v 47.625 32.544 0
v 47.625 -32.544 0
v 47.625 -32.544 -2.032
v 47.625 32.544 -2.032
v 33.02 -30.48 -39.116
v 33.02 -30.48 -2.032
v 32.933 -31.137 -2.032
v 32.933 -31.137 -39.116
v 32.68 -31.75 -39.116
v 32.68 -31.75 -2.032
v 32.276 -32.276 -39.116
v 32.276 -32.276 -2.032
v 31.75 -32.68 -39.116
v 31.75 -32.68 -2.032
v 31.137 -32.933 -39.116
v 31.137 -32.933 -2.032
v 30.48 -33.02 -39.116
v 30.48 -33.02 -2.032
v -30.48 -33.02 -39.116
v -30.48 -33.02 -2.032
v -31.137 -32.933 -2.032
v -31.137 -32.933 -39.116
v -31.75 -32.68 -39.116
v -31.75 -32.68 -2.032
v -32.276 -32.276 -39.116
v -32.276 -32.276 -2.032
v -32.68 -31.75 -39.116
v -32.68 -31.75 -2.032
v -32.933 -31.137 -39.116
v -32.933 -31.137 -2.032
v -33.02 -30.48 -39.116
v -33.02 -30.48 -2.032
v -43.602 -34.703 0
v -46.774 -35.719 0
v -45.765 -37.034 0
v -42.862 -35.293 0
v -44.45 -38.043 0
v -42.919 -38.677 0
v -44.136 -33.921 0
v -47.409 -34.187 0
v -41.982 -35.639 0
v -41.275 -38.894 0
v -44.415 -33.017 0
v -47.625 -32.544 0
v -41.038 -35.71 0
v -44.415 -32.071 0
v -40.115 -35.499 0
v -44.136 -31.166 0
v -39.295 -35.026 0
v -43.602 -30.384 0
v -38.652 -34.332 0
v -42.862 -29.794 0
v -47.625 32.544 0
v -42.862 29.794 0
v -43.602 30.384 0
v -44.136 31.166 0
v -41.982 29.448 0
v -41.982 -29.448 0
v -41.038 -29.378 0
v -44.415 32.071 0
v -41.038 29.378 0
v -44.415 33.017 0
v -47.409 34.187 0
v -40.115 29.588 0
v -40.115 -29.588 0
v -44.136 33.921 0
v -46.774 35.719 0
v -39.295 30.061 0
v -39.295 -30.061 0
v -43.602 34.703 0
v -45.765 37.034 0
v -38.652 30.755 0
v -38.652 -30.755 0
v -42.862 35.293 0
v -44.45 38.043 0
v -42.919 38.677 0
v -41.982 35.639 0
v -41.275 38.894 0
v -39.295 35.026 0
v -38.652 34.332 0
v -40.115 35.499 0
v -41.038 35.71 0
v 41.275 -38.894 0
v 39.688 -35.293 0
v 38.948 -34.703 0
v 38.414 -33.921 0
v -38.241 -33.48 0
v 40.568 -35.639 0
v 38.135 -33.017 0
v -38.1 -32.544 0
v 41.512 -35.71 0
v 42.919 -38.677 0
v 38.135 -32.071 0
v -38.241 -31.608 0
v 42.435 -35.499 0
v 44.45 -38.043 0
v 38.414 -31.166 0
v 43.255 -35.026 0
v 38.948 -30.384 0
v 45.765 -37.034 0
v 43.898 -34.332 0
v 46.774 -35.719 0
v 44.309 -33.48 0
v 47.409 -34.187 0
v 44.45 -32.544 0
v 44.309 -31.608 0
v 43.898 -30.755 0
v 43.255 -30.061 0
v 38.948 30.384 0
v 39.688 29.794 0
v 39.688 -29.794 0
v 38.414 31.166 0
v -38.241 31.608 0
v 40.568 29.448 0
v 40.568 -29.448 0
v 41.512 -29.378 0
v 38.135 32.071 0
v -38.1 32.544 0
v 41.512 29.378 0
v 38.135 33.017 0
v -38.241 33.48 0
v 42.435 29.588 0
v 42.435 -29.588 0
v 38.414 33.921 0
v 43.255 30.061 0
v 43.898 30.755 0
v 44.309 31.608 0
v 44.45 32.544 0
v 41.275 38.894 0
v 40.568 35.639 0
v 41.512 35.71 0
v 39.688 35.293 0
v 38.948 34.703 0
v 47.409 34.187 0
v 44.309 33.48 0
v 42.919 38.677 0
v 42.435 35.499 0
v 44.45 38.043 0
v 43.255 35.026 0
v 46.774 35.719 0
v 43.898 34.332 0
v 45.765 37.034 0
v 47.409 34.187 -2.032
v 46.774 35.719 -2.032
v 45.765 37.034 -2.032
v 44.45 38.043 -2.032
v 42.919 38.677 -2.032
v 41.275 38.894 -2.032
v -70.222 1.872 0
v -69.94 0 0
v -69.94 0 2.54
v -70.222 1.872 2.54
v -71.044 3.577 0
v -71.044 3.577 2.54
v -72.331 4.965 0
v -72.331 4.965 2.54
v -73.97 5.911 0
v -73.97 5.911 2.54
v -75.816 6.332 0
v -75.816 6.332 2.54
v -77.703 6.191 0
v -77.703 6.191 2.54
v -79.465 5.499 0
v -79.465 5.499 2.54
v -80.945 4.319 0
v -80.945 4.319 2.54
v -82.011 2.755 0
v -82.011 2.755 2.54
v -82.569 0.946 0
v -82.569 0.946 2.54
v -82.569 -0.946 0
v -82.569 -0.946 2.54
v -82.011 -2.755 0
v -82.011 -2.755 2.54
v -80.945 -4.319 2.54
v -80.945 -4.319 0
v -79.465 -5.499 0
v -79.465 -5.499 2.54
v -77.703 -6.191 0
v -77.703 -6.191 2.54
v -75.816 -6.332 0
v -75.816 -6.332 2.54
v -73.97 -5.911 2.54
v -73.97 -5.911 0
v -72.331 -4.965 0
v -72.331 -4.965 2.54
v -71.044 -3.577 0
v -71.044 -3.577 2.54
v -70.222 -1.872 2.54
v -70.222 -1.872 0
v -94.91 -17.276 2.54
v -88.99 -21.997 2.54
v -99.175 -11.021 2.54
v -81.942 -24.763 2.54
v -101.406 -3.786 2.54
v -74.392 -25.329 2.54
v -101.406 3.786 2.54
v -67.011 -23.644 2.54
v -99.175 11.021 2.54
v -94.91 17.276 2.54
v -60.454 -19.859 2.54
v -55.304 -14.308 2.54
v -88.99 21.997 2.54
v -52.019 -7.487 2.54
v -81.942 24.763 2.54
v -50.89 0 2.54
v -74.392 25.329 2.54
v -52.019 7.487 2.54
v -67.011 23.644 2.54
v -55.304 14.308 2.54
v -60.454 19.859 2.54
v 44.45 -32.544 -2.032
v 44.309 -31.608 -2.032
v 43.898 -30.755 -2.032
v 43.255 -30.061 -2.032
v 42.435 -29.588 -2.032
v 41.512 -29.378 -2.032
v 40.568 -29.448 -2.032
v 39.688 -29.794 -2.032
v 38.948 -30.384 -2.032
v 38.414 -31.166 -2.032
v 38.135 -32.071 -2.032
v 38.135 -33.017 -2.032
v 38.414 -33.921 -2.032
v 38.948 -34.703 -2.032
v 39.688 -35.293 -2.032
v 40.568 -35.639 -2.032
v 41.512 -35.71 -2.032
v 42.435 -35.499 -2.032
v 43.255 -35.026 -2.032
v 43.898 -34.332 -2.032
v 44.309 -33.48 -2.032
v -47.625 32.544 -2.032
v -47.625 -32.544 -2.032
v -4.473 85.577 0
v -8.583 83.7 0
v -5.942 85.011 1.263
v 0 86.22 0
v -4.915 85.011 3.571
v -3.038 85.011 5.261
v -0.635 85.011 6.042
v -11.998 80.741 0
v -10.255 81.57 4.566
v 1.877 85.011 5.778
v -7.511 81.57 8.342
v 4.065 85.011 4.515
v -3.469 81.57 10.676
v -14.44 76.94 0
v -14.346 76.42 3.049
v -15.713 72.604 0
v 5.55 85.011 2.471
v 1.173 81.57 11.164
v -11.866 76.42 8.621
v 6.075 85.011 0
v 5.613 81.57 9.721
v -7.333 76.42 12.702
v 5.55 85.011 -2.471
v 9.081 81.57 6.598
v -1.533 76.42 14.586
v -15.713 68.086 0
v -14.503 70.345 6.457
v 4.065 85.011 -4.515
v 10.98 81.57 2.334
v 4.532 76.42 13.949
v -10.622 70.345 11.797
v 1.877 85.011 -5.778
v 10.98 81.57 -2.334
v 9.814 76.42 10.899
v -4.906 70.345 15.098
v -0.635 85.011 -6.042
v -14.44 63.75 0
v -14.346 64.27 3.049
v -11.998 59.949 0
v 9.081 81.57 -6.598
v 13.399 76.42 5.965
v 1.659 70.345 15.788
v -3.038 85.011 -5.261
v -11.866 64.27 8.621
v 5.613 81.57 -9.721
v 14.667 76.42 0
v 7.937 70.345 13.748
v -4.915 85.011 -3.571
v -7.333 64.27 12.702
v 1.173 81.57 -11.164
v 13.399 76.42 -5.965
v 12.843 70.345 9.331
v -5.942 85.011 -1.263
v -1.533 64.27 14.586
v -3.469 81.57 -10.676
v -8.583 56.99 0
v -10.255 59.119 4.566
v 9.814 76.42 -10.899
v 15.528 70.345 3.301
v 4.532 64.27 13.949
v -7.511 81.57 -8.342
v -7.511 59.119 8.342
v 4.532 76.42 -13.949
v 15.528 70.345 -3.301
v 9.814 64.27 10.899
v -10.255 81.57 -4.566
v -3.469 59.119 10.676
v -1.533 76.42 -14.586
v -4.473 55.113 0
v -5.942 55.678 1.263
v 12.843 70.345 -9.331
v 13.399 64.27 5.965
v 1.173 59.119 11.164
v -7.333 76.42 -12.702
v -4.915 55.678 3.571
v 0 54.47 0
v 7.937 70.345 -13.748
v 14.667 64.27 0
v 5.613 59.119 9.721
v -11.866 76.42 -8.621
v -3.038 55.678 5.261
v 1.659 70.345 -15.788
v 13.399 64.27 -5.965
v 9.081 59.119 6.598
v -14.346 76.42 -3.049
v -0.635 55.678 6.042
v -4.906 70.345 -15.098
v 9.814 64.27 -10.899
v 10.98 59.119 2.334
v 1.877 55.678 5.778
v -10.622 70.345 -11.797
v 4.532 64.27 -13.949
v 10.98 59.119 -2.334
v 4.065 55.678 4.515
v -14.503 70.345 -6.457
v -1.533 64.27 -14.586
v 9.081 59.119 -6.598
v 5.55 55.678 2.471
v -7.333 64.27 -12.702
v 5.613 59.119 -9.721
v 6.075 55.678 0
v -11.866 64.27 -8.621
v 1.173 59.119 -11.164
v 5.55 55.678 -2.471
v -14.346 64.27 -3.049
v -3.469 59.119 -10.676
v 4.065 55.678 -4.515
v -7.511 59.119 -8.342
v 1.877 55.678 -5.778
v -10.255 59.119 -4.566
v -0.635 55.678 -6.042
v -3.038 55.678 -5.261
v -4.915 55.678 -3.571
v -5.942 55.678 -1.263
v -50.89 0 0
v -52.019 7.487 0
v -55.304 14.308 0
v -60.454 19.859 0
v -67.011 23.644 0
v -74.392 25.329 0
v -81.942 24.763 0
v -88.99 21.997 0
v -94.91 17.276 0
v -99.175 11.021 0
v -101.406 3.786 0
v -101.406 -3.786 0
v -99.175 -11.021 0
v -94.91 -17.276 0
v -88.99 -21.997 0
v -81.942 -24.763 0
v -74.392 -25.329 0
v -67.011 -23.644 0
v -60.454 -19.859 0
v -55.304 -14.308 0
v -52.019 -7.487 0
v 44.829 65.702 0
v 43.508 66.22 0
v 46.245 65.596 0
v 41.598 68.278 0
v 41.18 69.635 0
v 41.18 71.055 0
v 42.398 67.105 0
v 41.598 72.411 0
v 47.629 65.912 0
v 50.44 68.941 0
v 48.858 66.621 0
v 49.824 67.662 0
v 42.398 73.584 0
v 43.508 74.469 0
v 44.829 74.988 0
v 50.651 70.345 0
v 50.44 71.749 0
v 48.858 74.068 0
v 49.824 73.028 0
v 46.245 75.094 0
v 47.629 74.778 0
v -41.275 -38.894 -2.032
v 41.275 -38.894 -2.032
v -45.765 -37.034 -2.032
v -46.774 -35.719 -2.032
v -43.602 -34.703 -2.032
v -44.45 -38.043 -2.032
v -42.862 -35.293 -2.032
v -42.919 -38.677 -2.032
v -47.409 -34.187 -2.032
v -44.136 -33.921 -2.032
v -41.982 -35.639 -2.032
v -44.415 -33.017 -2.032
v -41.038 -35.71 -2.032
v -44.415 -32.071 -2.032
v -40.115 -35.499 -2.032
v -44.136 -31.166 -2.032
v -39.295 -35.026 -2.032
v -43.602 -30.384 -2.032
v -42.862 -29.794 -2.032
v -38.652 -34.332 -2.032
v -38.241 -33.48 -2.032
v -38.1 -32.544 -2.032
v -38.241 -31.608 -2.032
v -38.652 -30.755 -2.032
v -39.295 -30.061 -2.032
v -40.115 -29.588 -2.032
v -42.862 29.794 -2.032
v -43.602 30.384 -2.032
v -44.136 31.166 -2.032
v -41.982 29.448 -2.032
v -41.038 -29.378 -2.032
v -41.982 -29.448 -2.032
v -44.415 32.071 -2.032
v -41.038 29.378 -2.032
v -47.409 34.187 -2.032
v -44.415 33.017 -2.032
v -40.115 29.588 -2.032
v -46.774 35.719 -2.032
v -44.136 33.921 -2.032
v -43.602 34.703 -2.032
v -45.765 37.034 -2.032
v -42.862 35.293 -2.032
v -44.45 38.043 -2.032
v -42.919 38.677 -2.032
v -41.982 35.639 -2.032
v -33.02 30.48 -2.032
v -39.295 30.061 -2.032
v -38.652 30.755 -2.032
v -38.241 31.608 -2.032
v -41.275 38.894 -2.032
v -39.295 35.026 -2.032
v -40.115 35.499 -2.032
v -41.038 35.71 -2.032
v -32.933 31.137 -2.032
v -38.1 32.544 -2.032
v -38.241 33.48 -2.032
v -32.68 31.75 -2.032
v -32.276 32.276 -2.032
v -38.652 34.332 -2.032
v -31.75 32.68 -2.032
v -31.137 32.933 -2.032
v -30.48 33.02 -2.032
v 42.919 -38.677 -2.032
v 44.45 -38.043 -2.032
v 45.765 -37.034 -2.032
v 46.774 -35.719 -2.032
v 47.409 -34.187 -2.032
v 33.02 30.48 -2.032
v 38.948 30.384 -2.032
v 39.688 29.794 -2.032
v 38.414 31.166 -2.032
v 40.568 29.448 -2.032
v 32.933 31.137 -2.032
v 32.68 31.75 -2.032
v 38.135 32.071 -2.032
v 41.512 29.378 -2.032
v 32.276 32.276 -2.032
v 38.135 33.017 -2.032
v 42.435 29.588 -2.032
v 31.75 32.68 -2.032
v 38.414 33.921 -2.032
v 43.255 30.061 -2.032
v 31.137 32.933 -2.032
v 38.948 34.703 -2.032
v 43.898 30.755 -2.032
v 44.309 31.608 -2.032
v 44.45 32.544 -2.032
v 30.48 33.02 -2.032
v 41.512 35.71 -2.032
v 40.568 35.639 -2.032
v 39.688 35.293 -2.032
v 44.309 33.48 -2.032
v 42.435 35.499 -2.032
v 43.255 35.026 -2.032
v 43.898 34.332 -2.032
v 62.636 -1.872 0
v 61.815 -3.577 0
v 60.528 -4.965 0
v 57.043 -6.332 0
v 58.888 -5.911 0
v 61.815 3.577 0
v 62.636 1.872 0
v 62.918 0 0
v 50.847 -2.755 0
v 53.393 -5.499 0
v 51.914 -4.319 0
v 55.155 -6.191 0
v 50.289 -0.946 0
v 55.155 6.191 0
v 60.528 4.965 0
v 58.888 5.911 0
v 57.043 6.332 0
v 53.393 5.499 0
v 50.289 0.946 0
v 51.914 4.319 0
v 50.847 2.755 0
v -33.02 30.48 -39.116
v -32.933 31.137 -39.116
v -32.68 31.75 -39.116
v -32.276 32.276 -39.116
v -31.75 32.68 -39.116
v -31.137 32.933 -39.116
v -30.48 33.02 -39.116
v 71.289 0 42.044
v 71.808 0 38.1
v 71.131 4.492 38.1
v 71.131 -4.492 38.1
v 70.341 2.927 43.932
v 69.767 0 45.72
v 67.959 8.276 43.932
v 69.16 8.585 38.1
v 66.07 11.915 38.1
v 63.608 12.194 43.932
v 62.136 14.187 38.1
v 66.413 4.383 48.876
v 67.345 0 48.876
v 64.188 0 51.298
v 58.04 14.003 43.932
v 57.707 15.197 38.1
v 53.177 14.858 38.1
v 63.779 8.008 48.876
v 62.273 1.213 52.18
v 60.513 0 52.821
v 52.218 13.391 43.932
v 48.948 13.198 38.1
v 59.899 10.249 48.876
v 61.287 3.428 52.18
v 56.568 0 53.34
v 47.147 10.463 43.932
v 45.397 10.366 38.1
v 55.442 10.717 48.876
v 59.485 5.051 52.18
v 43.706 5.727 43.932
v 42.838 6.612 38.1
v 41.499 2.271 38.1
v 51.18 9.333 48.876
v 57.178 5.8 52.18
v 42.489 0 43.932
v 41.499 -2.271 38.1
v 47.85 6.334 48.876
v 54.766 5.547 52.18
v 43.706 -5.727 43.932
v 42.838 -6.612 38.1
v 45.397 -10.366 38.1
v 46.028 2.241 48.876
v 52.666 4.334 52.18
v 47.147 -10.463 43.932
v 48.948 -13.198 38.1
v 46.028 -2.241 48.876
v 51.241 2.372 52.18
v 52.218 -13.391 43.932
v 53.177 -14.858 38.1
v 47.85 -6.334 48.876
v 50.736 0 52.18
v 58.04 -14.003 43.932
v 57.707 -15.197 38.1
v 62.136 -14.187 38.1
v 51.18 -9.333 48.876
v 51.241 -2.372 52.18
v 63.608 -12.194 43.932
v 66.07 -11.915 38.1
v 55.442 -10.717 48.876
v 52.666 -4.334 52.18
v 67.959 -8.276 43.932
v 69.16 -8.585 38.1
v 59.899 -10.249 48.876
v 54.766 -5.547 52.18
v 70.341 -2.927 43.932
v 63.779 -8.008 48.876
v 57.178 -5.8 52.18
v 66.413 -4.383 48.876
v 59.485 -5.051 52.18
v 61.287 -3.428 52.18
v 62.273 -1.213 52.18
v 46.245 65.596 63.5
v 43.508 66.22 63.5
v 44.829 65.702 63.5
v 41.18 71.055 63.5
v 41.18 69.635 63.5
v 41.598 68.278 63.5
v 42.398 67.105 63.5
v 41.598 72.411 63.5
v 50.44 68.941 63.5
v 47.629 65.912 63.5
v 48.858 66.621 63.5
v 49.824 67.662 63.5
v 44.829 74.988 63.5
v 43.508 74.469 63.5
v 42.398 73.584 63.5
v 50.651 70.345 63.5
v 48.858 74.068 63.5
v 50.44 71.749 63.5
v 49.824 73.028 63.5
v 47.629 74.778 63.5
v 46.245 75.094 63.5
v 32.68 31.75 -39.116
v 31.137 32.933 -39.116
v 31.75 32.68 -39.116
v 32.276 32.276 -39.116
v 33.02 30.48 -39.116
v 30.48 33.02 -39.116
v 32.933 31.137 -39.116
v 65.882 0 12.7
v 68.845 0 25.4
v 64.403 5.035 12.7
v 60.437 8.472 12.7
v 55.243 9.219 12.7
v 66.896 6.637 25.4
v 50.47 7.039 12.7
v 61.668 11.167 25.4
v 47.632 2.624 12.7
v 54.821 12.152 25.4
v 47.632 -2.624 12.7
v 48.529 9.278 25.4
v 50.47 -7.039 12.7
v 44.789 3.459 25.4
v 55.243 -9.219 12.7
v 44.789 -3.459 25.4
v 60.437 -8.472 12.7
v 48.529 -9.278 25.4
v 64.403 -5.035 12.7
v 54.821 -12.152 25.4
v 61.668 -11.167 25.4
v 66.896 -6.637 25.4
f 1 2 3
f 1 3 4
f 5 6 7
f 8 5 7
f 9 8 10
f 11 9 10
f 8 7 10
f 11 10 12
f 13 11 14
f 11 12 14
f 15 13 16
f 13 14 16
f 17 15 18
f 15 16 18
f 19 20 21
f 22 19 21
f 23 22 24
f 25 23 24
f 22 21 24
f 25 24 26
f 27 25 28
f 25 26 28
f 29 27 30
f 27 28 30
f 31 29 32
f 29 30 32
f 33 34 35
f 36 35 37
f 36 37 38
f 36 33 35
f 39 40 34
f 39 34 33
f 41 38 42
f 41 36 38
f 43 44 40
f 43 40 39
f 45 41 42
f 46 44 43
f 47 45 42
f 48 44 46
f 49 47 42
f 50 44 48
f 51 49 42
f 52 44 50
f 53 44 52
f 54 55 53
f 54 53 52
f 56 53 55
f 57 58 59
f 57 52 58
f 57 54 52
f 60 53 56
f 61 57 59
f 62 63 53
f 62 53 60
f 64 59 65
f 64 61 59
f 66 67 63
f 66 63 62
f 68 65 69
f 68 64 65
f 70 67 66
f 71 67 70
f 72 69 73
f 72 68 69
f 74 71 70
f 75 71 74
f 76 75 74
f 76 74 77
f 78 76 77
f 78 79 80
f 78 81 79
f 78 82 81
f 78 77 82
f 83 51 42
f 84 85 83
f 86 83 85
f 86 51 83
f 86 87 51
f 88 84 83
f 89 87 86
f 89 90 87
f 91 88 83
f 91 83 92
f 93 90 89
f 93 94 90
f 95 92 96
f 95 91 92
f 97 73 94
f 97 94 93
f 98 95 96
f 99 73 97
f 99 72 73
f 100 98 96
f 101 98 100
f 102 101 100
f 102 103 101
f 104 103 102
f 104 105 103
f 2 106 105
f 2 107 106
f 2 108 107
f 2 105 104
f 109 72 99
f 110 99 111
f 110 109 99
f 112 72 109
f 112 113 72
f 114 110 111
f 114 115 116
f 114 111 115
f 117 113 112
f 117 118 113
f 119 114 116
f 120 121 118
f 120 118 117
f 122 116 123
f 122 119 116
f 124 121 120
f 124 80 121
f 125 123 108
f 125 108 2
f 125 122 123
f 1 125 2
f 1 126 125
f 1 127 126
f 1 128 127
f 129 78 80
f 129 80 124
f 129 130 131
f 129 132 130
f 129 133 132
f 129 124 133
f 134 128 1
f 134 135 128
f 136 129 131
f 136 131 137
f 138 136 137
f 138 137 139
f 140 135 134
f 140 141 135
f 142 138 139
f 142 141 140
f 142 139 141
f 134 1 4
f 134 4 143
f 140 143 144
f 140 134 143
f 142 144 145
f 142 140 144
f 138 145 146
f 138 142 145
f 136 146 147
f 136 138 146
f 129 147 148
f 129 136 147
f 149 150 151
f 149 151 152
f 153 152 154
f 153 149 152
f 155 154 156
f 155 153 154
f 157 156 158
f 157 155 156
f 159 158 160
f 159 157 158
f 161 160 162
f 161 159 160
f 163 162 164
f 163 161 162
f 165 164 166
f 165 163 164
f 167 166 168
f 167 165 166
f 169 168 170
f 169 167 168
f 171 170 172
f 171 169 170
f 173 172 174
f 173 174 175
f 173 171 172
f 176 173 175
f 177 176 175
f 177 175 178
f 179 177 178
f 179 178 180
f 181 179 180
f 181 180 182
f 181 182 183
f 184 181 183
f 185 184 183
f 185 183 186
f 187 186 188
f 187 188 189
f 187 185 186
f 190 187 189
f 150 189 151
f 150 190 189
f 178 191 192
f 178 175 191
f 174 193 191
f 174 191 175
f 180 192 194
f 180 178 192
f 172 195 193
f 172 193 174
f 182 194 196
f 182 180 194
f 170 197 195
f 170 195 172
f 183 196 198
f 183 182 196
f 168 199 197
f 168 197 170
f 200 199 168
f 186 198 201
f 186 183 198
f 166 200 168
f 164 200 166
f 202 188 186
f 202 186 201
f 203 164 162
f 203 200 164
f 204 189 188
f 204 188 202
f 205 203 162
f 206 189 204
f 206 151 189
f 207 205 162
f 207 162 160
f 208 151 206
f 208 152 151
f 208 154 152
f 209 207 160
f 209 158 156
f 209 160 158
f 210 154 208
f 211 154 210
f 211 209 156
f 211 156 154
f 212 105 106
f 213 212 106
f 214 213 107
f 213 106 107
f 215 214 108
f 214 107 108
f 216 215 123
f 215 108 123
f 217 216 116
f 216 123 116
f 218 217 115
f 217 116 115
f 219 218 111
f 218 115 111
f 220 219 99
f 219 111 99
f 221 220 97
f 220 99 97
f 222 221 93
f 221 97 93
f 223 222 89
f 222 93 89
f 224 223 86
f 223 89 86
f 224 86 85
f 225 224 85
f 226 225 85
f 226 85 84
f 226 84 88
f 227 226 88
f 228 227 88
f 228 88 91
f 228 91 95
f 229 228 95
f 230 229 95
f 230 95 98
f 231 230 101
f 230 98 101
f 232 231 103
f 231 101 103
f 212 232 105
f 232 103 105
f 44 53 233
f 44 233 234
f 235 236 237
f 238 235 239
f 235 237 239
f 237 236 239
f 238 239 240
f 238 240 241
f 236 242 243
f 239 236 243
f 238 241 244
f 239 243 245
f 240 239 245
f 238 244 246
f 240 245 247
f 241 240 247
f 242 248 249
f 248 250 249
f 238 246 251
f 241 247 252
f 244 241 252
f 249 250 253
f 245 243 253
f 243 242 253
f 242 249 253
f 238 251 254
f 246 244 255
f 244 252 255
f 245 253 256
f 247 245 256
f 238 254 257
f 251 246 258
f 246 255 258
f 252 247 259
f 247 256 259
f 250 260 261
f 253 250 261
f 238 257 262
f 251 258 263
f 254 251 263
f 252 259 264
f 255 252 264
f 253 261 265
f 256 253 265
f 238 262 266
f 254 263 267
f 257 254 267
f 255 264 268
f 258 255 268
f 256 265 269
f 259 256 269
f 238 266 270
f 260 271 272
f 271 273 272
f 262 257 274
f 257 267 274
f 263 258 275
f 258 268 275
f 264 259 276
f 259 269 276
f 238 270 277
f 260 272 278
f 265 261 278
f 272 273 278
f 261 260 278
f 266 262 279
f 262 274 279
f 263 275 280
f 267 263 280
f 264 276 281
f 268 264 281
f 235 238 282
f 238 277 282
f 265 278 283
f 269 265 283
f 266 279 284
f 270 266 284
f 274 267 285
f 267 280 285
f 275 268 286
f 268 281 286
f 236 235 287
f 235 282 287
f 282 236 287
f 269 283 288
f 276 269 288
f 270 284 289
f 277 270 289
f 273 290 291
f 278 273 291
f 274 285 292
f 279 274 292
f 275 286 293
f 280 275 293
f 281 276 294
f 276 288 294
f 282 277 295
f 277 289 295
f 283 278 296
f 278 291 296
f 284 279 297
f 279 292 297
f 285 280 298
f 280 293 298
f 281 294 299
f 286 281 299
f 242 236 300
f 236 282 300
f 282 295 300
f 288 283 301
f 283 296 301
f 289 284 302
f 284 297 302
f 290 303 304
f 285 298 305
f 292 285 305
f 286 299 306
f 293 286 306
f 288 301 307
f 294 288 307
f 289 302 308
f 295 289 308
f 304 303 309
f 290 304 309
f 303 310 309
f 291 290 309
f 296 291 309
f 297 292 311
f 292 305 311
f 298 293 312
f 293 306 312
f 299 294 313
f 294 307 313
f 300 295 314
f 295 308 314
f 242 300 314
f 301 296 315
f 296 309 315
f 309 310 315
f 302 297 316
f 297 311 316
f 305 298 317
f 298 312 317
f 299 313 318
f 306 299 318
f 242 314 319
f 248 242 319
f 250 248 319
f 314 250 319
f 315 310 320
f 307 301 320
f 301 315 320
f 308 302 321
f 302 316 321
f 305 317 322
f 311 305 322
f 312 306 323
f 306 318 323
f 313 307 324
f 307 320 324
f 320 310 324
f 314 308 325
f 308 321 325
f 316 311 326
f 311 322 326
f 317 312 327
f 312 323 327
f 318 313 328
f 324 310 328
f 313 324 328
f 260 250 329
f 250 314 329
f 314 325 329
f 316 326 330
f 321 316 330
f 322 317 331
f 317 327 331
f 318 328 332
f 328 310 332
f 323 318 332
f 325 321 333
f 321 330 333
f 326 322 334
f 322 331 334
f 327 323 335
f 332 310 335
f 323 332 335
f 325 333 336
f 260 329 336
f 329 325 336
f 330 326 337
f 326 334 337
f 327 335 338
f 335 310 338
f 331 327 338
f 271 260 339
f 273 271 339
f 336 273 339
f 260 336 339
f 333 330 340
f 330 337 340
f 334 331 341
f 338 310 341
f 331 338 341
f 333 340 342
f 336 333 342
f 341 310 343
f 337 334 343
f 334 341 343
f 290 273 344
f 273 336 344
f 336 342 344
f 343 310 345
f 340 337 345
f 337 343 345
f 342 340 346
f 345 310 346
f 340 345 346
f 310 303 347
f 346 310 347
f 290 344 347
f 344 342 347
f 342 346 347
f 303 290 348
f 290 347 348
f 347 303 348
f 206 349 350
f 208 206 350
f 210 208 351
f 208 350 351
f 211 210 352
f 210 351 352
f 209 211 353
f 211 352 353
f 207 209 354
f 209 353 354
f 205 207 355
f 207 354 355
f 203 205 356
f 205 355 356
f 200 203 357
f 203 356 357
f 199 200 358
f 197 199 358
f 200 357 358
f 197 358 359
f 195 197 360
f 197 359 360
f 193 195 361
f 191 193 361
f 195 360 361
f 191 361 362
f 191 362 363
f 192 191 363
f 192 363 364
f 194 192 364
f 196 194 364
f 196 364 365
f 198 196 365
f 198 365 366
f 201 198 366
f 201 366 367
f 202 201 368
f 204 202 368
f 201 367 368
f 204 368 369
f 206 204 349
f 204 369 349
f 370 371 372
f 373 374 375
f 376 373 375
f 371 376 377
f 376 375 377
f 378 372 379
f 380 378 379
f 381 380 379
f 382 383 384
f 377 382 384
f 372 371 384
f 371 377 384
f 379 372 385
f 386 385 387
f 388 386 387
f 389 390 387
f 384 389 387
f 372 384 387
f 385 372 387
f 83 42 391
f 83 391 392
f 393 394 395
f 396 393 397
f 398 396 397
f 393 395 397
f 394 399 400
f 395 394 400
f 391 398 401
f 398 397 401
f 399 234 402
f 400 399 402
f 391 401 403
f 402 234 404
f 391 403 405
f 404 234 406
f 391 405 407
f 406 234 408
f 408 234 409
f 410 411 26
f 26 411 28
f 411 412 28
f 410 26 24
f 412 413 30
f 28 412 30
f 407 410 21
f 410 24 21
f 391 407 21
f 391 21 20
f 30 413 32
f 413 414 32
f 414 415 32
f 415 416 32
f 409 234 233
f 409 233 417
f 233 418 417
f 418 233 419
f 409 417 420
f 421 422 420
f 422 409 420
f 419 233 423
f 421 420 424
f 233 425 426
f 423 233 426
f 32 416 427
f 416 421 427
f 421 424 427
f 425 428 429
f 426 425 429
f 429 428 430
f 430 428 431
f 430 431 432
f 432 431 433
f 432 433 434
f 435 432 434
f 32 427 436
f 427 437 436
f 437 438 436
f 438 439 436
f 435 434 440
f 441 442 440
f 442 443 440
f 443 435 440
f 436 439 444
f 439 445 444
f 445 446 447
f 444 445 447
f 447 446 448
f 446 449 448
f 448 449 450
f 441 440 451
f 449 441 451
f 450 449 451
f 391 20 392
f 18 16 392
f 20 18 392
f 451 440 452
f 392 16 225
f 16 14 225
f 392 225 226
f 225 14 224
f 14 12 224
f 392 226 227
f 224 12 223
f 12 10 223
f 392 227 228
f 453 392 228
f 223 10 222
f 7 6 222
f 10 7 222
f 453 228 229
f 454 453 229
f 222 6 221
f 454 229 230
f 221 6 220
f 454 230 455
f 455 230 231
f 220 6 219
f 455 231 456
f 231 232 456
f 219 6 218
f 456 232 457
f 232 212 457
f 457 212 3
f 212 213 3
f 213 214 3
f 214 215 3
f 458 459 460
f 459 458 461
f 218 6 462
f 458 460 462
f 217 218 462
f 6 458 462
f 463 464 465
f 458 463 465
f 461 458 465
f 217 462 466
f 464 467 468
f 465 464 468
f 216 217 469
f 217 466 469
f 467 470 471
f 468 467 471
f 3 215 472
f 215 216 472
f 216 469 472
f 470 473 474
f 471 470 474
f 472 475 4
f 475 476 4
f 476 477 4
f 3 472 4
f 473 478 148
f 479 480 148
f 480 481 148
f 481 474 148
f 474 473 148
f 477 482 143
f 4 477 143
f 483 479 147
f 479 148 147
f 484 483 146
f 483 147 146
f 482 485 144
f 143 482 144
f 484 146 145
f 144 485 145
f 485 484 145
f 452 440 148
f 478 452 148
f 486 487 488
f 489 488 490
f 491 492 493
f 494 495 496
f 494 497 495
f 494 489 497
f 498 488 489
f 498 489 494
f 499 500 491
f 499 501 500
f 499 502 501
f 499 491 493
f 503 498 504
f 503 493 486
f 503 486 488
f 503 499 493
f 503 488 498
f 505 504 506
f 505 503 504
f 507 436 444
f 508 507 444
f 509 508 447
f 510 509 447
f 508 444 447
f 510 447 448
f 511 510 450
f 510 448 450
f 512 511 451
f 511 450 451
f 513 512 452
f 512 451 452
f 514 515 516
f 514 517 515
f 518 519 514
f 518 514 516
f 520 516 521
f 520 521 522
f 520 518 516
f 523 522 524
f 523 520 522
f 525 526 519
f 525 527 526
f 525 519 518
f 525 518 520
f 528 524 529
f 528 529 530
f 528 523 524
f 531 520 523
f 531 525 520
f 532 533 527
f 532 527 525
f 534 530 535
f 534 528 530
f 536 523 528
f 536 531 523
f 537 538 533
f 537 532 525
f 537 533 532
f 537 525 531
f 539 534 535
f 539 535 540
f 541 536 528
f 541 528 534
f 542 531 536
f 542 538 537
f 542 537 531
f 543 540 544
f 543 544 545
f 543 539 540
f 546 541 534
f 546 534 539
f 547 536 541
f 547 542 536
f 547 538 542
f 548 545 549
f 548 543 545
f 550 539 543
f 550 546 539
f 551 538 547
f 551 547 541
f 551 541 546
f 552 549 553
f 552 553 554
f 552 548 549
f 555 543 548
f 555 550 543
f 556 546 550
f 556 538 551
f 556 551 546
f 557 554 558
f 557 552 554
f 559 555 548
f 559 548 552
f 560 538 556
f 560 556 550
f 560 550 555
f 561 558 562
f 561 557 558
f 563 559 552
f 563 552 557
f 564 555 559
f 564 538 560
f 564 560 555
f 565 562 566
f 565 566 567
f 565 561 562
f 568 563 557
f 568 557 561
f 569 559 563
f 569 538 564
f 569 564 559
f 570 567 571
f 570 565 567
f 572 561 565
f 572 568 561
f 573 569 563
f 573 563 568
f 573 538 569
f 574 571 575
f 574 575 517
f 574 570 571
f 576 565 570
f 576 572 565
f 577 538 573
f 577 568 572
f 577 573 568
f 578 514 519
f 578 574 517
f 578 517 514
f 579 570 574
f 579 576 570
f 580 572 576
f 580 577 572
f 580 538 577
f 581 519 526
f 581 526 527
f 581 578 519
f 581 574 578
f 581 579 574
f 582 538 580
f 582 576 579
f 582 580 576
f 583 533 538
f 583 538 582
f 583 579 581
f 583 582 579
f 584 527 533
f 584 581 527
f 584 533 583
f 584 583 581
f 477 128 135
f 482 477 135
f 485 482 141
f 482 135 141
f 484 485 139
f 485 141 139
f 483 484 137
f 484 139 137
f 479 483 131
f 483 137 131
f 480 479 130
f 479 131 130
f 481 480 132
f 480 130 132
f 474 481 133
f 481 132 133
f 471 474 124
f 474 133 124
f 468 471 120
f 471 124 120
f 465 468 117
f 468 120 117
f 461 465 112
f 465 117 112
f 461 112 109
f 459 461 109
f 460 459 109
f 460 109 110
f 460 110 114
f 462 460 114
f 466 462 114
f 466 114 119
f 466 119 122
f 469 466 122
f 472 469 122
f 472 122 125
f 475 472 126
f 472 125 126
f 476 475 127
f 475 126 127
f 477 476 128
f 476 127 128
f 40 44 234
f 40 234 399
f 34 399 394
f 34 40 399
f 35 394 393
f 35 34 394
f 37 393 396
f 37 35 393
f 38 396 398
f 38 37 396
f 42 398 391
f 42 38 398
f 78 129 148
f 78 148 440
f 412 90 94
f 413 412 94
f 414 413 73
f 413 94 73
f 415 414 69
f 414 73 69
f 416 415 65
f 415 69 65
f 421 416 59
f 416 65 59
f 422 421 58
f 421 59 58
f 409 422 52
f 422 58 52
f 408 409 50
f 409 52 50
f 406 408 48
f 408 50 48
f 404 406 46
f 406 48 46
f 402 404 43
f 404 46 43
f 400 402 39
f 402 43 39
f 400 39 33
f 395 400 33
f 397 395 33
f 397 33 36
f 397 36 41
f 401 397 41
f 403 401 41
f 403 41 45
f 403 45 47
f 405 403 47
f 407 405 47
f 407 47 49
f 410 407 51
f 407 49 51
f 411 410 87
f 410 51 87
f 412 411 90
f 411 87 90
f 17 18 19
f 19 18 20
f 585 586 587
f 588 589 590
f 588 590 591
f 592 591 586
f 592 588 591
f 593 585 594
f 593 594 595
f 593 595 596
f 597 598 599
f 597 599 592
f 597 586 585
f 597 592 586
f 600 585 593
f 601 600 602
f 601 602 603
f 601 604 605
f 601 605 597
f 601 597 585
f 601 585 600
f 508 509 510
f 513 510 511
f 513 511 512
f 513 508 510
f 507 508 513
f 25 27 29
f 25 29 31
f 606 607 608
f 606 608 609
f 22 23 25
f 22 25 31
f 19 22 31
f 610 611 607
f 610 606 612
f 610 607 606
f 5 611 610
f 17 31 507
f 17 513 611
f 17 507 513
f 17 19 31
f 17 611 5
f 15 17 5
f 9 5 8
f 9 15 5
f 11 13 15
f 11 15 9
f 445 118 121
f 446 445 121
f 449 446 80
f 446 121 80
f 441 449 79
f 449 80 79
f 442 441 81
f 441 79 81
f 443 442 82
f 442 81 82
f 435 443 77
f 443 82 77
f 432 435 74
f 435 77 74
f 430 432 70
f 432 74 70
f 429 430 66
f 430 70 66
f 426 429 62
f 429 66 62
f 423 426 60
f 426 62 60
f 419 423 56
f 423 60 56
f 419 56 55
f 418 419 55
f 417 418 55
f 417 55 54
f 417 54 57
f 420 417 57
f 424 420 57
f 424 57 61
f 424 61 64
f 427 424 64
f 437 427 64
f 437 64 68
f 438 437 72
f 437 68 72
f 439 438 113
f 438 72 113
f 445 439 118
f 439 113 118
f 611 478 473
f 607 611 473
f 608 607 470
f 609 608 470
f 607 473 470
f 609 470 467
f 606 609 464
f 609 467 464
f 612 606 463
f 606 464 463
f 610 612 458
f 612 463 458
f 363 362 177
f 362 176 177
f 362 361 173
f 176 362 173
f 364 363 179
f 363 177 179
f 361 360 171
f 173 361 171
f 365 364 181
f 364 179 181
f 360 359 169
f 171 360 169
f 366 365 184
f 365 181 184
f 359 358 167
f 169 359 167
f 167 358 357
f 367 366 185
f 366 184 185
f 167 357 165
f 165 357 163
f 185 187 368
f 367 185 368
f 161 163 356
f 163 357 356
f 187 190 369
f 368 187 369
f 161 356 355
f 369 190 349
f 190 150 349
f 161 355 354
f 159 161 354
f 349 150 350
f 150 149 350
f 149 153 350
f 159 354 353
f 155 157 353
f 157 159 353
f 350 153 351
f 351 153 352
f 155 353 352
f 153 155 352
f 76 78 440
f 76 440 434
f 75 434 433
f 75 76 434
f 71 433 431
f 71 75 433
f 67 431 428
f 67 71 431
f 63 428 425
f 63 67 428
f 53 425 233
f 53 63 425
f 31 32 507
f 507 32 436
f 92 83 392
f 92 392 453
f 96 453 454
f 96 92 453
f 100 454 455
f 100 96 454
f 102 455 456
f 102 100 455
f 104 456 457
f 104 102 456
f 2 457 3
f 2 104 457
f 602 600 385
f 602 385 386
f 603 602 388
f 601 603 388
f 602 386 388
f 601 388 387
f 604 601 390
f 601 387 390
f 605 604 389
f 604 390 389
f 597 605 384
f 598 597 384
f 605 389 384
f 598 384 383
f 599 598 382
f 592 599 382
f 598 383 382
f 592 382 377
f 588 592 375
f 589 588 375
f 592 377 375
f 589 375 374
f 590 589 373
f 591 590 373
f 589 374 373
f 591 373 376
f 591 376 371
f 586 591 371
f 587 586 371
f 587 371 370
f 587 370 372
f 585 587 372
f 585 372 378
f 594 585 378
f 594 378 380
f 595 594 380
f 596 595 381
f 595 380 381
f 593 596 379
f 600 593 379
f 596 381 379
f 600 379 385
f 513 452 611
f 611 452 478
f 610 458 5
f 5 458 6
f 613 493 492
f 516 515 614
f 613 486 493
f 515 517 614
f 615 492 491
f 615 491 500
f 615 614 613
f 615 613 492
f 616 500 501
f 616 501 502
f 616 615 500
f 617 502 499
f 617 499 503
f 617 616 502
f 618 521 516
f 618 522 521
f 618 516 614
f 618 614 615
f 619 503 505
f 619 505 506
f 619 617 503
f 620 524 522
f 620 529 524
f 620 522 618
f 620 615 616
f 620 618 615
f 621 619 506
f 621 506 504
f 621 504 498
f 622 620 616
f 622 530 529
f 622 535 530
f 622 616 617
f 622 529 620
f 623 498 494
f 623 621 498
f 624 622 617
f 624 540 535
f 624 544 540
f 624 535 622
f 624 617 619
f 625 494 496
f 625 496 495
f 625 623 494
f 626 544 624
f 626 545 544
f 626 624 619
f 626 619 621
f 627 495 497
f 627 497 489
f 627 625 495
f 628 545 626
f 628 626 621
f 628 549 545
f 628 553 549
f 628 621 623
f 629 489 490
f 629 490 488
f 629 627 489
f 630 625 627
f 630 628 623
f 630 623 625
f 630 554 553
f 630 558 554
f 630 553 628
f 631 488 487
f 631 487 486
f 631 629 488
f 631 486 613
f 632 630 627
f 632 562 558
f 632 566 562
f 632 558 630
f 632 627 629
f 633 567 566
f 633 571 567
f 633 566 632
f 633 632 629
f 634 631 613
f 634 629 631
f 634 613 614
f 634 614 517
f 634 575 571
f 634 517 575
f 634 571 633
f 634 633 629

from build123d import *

# Parameters (mm, degrees)
F0_R     = 3.175
F0_R_2   = 4.7625
F1_DEPTH = 2.032
F3_DEPTH = 37.084
F8_DEPTH = 63.5
F0_R_3   = 25.4
F0_R_4   = 6.35
F9_DEPTH = 2.54


# Not quite as in the source:
# - a feature names something its author has since deleted; it is built from what else it names


with BuildPart() as f1:
    # F0 (on Top) → F1 (new body)
    with BuildSketch(Plane.XY):
        with BuildLine():
            ThreePointArc((47.625, 32.54375), (45.7651280605, 37.0338780605), (41.275, 38.89375))
            Line((41.275, 38.89375), (-41.275, 38.89375))
            ThreePointArc((-41.275, 38.89375), (-45.7651280605, 37.0338780605), (-47.625, 32.54375))
            Line((-47.625, 32.54375), (-47.625, -32.54375))
            ThreePointArc((-47.625, -32.54375), (-45.7651280605, -37.0338780605), (-41.275, -38.89375))
            Line((-41.275, -38.89375), (41.275, -38.89375))
            ThreePointArc((41.275, -38.89375), (45.7651280605, -37.0338780605), (47.625, -32.54375))
            Line((47.625, -32.54375), (47.625, 32.54375))
        make_face()
        with Locations((-41.275, -32.54375)):
            Circle(F0_R, mode=Mode.SUBTRACT)
        with Locations((41.275, -32.54375)):
            Circle(F0_R, mode=Mode.SUBTRACT)
        with Locations((-41.275, 32.54375)):
            Circle(F0_R, mode=Mode.SUBTRACT)
        Circle(F0_R_2, mode=Mode.SUBTRACT)
        with Locations((41.275, 32.54375)):
            Circle(F0_R, mode=Mode.SUBTRACT)
        Circle(F0_R_2)
    extrude(amount=-F1_DEPTH)

    # F2 (on face) → F3 (join)
    with BuildSketch(Plane(origin=(0, 0, -2.032), x_dir=(1, 0, 0), z_dir=(0, 0, -1))):
        with BuildLine():
            ThreePointArc((33.02, 30.48), (32.2760512242, 32.2760512242), (30.48, 33.02))
            Line((30.48, 33.02), (-30.48, 33.02))
            ThreePointArc((-30.48, 33.02), (-32.2760512242, 32.2760512242), (-33.02, 30.48))
            Line((-33.02, 30.48), (-33.02, -30.48))
            ThreePointArc((-33.02, -30.48), (-32.2760512242, -32.2760512242), (-30.48, -33.02))
            Line((-30.48, -33.02), (30.48, -33.02))
            ThreePointArc((30.48, -33.02), (32.2760512242, -32.2760512242), (33.02, -30.48))
            Line((33.02, -30.48), (33.02, 30.48))
        make_face()
    extrude(amount=F3_DEPTH)


with BuildPart() as f5:
    # F4 (on Top) → F5 (revolve)
    with BuildSketch(Plane.XY):
        with BuildLine():
            Line((0, 54.4698057175), (0, 86.2198057175))
            ThreePointArc((0, 86.2198057175), (-15.875, 70.3448057175), (0, 54.4698057175))
        make_face()
    revolve(axis=Axis((0, 70.3448057175, 0), (0, 1, 0)))


with BuildPart() as f7:
    # F6 (on Front) → F7 (revolve)
    with BuildSketch(Plane.XZ):
        Polygon((56.5684698522, 38.1), (56.5684698522, 0), (62.9184698522, 0), (71.8084698522, 38.1), align=None)
        with BuildLine():
            Line((56.5684698522, 53.34), (56.5684698522, 38.1))
            Line((56.5684698522, 38.1), (71.8084698522, 38.1))
            ThreePointArc((71.8084698522, 38.1), (67.3447771975, 48.8763073453), (56.5684698522, 53.34))
        make_face()
    revolve(axis=Axis((56.5684698522, 0, 19.05), (0, 0, 1)))


with BuildPart() as f8:
    # F4 (on Top) → F8 (new body)
    with BuildSketch(Plane.XY):
        with BuildLine():
            ThreePointArc((45.8889380097, 65.5823057175), (49.2565340551, 66.9772096721), (50.6514380097, 70.3448057175))
            ThreePointArc((50.6514380097, 70.3448057175), (49.2565340551, 73.7124017629), (45.8889380097, 75.1073057175))
            Line((45.8889380097, 75.1073057175), (45.8889380097, 65.5823057175))
        make_face()
        with BuildLine():
            Line((45.8889380097, 65.5823057175), (45.8889380097, 75.1073057175))
            ThreePointArc((45.8889380097, 75.1073057175), (41.1264380097, 70.3448057175), (45.8889380097, 65.5823057175))
        make_face()
    extrude(amount=F8_DEPTH)


with BuildPart() as f9:
    # F0 (on Top) → F9 (new body)
    with BuildSketch(Plane.XY):
        with Locations((-76.2901902199, 0)):
            Circle(F0_R_3)
        with Locations((-76.2901902199, 0)):
            Circle(F0_R_4, mode=Mode.SUBTRACT)
    extrude(amount=F9_DEPTH)


solid = Compound([f1.part, f5.part, f7.part, f8.part, f9.part])
